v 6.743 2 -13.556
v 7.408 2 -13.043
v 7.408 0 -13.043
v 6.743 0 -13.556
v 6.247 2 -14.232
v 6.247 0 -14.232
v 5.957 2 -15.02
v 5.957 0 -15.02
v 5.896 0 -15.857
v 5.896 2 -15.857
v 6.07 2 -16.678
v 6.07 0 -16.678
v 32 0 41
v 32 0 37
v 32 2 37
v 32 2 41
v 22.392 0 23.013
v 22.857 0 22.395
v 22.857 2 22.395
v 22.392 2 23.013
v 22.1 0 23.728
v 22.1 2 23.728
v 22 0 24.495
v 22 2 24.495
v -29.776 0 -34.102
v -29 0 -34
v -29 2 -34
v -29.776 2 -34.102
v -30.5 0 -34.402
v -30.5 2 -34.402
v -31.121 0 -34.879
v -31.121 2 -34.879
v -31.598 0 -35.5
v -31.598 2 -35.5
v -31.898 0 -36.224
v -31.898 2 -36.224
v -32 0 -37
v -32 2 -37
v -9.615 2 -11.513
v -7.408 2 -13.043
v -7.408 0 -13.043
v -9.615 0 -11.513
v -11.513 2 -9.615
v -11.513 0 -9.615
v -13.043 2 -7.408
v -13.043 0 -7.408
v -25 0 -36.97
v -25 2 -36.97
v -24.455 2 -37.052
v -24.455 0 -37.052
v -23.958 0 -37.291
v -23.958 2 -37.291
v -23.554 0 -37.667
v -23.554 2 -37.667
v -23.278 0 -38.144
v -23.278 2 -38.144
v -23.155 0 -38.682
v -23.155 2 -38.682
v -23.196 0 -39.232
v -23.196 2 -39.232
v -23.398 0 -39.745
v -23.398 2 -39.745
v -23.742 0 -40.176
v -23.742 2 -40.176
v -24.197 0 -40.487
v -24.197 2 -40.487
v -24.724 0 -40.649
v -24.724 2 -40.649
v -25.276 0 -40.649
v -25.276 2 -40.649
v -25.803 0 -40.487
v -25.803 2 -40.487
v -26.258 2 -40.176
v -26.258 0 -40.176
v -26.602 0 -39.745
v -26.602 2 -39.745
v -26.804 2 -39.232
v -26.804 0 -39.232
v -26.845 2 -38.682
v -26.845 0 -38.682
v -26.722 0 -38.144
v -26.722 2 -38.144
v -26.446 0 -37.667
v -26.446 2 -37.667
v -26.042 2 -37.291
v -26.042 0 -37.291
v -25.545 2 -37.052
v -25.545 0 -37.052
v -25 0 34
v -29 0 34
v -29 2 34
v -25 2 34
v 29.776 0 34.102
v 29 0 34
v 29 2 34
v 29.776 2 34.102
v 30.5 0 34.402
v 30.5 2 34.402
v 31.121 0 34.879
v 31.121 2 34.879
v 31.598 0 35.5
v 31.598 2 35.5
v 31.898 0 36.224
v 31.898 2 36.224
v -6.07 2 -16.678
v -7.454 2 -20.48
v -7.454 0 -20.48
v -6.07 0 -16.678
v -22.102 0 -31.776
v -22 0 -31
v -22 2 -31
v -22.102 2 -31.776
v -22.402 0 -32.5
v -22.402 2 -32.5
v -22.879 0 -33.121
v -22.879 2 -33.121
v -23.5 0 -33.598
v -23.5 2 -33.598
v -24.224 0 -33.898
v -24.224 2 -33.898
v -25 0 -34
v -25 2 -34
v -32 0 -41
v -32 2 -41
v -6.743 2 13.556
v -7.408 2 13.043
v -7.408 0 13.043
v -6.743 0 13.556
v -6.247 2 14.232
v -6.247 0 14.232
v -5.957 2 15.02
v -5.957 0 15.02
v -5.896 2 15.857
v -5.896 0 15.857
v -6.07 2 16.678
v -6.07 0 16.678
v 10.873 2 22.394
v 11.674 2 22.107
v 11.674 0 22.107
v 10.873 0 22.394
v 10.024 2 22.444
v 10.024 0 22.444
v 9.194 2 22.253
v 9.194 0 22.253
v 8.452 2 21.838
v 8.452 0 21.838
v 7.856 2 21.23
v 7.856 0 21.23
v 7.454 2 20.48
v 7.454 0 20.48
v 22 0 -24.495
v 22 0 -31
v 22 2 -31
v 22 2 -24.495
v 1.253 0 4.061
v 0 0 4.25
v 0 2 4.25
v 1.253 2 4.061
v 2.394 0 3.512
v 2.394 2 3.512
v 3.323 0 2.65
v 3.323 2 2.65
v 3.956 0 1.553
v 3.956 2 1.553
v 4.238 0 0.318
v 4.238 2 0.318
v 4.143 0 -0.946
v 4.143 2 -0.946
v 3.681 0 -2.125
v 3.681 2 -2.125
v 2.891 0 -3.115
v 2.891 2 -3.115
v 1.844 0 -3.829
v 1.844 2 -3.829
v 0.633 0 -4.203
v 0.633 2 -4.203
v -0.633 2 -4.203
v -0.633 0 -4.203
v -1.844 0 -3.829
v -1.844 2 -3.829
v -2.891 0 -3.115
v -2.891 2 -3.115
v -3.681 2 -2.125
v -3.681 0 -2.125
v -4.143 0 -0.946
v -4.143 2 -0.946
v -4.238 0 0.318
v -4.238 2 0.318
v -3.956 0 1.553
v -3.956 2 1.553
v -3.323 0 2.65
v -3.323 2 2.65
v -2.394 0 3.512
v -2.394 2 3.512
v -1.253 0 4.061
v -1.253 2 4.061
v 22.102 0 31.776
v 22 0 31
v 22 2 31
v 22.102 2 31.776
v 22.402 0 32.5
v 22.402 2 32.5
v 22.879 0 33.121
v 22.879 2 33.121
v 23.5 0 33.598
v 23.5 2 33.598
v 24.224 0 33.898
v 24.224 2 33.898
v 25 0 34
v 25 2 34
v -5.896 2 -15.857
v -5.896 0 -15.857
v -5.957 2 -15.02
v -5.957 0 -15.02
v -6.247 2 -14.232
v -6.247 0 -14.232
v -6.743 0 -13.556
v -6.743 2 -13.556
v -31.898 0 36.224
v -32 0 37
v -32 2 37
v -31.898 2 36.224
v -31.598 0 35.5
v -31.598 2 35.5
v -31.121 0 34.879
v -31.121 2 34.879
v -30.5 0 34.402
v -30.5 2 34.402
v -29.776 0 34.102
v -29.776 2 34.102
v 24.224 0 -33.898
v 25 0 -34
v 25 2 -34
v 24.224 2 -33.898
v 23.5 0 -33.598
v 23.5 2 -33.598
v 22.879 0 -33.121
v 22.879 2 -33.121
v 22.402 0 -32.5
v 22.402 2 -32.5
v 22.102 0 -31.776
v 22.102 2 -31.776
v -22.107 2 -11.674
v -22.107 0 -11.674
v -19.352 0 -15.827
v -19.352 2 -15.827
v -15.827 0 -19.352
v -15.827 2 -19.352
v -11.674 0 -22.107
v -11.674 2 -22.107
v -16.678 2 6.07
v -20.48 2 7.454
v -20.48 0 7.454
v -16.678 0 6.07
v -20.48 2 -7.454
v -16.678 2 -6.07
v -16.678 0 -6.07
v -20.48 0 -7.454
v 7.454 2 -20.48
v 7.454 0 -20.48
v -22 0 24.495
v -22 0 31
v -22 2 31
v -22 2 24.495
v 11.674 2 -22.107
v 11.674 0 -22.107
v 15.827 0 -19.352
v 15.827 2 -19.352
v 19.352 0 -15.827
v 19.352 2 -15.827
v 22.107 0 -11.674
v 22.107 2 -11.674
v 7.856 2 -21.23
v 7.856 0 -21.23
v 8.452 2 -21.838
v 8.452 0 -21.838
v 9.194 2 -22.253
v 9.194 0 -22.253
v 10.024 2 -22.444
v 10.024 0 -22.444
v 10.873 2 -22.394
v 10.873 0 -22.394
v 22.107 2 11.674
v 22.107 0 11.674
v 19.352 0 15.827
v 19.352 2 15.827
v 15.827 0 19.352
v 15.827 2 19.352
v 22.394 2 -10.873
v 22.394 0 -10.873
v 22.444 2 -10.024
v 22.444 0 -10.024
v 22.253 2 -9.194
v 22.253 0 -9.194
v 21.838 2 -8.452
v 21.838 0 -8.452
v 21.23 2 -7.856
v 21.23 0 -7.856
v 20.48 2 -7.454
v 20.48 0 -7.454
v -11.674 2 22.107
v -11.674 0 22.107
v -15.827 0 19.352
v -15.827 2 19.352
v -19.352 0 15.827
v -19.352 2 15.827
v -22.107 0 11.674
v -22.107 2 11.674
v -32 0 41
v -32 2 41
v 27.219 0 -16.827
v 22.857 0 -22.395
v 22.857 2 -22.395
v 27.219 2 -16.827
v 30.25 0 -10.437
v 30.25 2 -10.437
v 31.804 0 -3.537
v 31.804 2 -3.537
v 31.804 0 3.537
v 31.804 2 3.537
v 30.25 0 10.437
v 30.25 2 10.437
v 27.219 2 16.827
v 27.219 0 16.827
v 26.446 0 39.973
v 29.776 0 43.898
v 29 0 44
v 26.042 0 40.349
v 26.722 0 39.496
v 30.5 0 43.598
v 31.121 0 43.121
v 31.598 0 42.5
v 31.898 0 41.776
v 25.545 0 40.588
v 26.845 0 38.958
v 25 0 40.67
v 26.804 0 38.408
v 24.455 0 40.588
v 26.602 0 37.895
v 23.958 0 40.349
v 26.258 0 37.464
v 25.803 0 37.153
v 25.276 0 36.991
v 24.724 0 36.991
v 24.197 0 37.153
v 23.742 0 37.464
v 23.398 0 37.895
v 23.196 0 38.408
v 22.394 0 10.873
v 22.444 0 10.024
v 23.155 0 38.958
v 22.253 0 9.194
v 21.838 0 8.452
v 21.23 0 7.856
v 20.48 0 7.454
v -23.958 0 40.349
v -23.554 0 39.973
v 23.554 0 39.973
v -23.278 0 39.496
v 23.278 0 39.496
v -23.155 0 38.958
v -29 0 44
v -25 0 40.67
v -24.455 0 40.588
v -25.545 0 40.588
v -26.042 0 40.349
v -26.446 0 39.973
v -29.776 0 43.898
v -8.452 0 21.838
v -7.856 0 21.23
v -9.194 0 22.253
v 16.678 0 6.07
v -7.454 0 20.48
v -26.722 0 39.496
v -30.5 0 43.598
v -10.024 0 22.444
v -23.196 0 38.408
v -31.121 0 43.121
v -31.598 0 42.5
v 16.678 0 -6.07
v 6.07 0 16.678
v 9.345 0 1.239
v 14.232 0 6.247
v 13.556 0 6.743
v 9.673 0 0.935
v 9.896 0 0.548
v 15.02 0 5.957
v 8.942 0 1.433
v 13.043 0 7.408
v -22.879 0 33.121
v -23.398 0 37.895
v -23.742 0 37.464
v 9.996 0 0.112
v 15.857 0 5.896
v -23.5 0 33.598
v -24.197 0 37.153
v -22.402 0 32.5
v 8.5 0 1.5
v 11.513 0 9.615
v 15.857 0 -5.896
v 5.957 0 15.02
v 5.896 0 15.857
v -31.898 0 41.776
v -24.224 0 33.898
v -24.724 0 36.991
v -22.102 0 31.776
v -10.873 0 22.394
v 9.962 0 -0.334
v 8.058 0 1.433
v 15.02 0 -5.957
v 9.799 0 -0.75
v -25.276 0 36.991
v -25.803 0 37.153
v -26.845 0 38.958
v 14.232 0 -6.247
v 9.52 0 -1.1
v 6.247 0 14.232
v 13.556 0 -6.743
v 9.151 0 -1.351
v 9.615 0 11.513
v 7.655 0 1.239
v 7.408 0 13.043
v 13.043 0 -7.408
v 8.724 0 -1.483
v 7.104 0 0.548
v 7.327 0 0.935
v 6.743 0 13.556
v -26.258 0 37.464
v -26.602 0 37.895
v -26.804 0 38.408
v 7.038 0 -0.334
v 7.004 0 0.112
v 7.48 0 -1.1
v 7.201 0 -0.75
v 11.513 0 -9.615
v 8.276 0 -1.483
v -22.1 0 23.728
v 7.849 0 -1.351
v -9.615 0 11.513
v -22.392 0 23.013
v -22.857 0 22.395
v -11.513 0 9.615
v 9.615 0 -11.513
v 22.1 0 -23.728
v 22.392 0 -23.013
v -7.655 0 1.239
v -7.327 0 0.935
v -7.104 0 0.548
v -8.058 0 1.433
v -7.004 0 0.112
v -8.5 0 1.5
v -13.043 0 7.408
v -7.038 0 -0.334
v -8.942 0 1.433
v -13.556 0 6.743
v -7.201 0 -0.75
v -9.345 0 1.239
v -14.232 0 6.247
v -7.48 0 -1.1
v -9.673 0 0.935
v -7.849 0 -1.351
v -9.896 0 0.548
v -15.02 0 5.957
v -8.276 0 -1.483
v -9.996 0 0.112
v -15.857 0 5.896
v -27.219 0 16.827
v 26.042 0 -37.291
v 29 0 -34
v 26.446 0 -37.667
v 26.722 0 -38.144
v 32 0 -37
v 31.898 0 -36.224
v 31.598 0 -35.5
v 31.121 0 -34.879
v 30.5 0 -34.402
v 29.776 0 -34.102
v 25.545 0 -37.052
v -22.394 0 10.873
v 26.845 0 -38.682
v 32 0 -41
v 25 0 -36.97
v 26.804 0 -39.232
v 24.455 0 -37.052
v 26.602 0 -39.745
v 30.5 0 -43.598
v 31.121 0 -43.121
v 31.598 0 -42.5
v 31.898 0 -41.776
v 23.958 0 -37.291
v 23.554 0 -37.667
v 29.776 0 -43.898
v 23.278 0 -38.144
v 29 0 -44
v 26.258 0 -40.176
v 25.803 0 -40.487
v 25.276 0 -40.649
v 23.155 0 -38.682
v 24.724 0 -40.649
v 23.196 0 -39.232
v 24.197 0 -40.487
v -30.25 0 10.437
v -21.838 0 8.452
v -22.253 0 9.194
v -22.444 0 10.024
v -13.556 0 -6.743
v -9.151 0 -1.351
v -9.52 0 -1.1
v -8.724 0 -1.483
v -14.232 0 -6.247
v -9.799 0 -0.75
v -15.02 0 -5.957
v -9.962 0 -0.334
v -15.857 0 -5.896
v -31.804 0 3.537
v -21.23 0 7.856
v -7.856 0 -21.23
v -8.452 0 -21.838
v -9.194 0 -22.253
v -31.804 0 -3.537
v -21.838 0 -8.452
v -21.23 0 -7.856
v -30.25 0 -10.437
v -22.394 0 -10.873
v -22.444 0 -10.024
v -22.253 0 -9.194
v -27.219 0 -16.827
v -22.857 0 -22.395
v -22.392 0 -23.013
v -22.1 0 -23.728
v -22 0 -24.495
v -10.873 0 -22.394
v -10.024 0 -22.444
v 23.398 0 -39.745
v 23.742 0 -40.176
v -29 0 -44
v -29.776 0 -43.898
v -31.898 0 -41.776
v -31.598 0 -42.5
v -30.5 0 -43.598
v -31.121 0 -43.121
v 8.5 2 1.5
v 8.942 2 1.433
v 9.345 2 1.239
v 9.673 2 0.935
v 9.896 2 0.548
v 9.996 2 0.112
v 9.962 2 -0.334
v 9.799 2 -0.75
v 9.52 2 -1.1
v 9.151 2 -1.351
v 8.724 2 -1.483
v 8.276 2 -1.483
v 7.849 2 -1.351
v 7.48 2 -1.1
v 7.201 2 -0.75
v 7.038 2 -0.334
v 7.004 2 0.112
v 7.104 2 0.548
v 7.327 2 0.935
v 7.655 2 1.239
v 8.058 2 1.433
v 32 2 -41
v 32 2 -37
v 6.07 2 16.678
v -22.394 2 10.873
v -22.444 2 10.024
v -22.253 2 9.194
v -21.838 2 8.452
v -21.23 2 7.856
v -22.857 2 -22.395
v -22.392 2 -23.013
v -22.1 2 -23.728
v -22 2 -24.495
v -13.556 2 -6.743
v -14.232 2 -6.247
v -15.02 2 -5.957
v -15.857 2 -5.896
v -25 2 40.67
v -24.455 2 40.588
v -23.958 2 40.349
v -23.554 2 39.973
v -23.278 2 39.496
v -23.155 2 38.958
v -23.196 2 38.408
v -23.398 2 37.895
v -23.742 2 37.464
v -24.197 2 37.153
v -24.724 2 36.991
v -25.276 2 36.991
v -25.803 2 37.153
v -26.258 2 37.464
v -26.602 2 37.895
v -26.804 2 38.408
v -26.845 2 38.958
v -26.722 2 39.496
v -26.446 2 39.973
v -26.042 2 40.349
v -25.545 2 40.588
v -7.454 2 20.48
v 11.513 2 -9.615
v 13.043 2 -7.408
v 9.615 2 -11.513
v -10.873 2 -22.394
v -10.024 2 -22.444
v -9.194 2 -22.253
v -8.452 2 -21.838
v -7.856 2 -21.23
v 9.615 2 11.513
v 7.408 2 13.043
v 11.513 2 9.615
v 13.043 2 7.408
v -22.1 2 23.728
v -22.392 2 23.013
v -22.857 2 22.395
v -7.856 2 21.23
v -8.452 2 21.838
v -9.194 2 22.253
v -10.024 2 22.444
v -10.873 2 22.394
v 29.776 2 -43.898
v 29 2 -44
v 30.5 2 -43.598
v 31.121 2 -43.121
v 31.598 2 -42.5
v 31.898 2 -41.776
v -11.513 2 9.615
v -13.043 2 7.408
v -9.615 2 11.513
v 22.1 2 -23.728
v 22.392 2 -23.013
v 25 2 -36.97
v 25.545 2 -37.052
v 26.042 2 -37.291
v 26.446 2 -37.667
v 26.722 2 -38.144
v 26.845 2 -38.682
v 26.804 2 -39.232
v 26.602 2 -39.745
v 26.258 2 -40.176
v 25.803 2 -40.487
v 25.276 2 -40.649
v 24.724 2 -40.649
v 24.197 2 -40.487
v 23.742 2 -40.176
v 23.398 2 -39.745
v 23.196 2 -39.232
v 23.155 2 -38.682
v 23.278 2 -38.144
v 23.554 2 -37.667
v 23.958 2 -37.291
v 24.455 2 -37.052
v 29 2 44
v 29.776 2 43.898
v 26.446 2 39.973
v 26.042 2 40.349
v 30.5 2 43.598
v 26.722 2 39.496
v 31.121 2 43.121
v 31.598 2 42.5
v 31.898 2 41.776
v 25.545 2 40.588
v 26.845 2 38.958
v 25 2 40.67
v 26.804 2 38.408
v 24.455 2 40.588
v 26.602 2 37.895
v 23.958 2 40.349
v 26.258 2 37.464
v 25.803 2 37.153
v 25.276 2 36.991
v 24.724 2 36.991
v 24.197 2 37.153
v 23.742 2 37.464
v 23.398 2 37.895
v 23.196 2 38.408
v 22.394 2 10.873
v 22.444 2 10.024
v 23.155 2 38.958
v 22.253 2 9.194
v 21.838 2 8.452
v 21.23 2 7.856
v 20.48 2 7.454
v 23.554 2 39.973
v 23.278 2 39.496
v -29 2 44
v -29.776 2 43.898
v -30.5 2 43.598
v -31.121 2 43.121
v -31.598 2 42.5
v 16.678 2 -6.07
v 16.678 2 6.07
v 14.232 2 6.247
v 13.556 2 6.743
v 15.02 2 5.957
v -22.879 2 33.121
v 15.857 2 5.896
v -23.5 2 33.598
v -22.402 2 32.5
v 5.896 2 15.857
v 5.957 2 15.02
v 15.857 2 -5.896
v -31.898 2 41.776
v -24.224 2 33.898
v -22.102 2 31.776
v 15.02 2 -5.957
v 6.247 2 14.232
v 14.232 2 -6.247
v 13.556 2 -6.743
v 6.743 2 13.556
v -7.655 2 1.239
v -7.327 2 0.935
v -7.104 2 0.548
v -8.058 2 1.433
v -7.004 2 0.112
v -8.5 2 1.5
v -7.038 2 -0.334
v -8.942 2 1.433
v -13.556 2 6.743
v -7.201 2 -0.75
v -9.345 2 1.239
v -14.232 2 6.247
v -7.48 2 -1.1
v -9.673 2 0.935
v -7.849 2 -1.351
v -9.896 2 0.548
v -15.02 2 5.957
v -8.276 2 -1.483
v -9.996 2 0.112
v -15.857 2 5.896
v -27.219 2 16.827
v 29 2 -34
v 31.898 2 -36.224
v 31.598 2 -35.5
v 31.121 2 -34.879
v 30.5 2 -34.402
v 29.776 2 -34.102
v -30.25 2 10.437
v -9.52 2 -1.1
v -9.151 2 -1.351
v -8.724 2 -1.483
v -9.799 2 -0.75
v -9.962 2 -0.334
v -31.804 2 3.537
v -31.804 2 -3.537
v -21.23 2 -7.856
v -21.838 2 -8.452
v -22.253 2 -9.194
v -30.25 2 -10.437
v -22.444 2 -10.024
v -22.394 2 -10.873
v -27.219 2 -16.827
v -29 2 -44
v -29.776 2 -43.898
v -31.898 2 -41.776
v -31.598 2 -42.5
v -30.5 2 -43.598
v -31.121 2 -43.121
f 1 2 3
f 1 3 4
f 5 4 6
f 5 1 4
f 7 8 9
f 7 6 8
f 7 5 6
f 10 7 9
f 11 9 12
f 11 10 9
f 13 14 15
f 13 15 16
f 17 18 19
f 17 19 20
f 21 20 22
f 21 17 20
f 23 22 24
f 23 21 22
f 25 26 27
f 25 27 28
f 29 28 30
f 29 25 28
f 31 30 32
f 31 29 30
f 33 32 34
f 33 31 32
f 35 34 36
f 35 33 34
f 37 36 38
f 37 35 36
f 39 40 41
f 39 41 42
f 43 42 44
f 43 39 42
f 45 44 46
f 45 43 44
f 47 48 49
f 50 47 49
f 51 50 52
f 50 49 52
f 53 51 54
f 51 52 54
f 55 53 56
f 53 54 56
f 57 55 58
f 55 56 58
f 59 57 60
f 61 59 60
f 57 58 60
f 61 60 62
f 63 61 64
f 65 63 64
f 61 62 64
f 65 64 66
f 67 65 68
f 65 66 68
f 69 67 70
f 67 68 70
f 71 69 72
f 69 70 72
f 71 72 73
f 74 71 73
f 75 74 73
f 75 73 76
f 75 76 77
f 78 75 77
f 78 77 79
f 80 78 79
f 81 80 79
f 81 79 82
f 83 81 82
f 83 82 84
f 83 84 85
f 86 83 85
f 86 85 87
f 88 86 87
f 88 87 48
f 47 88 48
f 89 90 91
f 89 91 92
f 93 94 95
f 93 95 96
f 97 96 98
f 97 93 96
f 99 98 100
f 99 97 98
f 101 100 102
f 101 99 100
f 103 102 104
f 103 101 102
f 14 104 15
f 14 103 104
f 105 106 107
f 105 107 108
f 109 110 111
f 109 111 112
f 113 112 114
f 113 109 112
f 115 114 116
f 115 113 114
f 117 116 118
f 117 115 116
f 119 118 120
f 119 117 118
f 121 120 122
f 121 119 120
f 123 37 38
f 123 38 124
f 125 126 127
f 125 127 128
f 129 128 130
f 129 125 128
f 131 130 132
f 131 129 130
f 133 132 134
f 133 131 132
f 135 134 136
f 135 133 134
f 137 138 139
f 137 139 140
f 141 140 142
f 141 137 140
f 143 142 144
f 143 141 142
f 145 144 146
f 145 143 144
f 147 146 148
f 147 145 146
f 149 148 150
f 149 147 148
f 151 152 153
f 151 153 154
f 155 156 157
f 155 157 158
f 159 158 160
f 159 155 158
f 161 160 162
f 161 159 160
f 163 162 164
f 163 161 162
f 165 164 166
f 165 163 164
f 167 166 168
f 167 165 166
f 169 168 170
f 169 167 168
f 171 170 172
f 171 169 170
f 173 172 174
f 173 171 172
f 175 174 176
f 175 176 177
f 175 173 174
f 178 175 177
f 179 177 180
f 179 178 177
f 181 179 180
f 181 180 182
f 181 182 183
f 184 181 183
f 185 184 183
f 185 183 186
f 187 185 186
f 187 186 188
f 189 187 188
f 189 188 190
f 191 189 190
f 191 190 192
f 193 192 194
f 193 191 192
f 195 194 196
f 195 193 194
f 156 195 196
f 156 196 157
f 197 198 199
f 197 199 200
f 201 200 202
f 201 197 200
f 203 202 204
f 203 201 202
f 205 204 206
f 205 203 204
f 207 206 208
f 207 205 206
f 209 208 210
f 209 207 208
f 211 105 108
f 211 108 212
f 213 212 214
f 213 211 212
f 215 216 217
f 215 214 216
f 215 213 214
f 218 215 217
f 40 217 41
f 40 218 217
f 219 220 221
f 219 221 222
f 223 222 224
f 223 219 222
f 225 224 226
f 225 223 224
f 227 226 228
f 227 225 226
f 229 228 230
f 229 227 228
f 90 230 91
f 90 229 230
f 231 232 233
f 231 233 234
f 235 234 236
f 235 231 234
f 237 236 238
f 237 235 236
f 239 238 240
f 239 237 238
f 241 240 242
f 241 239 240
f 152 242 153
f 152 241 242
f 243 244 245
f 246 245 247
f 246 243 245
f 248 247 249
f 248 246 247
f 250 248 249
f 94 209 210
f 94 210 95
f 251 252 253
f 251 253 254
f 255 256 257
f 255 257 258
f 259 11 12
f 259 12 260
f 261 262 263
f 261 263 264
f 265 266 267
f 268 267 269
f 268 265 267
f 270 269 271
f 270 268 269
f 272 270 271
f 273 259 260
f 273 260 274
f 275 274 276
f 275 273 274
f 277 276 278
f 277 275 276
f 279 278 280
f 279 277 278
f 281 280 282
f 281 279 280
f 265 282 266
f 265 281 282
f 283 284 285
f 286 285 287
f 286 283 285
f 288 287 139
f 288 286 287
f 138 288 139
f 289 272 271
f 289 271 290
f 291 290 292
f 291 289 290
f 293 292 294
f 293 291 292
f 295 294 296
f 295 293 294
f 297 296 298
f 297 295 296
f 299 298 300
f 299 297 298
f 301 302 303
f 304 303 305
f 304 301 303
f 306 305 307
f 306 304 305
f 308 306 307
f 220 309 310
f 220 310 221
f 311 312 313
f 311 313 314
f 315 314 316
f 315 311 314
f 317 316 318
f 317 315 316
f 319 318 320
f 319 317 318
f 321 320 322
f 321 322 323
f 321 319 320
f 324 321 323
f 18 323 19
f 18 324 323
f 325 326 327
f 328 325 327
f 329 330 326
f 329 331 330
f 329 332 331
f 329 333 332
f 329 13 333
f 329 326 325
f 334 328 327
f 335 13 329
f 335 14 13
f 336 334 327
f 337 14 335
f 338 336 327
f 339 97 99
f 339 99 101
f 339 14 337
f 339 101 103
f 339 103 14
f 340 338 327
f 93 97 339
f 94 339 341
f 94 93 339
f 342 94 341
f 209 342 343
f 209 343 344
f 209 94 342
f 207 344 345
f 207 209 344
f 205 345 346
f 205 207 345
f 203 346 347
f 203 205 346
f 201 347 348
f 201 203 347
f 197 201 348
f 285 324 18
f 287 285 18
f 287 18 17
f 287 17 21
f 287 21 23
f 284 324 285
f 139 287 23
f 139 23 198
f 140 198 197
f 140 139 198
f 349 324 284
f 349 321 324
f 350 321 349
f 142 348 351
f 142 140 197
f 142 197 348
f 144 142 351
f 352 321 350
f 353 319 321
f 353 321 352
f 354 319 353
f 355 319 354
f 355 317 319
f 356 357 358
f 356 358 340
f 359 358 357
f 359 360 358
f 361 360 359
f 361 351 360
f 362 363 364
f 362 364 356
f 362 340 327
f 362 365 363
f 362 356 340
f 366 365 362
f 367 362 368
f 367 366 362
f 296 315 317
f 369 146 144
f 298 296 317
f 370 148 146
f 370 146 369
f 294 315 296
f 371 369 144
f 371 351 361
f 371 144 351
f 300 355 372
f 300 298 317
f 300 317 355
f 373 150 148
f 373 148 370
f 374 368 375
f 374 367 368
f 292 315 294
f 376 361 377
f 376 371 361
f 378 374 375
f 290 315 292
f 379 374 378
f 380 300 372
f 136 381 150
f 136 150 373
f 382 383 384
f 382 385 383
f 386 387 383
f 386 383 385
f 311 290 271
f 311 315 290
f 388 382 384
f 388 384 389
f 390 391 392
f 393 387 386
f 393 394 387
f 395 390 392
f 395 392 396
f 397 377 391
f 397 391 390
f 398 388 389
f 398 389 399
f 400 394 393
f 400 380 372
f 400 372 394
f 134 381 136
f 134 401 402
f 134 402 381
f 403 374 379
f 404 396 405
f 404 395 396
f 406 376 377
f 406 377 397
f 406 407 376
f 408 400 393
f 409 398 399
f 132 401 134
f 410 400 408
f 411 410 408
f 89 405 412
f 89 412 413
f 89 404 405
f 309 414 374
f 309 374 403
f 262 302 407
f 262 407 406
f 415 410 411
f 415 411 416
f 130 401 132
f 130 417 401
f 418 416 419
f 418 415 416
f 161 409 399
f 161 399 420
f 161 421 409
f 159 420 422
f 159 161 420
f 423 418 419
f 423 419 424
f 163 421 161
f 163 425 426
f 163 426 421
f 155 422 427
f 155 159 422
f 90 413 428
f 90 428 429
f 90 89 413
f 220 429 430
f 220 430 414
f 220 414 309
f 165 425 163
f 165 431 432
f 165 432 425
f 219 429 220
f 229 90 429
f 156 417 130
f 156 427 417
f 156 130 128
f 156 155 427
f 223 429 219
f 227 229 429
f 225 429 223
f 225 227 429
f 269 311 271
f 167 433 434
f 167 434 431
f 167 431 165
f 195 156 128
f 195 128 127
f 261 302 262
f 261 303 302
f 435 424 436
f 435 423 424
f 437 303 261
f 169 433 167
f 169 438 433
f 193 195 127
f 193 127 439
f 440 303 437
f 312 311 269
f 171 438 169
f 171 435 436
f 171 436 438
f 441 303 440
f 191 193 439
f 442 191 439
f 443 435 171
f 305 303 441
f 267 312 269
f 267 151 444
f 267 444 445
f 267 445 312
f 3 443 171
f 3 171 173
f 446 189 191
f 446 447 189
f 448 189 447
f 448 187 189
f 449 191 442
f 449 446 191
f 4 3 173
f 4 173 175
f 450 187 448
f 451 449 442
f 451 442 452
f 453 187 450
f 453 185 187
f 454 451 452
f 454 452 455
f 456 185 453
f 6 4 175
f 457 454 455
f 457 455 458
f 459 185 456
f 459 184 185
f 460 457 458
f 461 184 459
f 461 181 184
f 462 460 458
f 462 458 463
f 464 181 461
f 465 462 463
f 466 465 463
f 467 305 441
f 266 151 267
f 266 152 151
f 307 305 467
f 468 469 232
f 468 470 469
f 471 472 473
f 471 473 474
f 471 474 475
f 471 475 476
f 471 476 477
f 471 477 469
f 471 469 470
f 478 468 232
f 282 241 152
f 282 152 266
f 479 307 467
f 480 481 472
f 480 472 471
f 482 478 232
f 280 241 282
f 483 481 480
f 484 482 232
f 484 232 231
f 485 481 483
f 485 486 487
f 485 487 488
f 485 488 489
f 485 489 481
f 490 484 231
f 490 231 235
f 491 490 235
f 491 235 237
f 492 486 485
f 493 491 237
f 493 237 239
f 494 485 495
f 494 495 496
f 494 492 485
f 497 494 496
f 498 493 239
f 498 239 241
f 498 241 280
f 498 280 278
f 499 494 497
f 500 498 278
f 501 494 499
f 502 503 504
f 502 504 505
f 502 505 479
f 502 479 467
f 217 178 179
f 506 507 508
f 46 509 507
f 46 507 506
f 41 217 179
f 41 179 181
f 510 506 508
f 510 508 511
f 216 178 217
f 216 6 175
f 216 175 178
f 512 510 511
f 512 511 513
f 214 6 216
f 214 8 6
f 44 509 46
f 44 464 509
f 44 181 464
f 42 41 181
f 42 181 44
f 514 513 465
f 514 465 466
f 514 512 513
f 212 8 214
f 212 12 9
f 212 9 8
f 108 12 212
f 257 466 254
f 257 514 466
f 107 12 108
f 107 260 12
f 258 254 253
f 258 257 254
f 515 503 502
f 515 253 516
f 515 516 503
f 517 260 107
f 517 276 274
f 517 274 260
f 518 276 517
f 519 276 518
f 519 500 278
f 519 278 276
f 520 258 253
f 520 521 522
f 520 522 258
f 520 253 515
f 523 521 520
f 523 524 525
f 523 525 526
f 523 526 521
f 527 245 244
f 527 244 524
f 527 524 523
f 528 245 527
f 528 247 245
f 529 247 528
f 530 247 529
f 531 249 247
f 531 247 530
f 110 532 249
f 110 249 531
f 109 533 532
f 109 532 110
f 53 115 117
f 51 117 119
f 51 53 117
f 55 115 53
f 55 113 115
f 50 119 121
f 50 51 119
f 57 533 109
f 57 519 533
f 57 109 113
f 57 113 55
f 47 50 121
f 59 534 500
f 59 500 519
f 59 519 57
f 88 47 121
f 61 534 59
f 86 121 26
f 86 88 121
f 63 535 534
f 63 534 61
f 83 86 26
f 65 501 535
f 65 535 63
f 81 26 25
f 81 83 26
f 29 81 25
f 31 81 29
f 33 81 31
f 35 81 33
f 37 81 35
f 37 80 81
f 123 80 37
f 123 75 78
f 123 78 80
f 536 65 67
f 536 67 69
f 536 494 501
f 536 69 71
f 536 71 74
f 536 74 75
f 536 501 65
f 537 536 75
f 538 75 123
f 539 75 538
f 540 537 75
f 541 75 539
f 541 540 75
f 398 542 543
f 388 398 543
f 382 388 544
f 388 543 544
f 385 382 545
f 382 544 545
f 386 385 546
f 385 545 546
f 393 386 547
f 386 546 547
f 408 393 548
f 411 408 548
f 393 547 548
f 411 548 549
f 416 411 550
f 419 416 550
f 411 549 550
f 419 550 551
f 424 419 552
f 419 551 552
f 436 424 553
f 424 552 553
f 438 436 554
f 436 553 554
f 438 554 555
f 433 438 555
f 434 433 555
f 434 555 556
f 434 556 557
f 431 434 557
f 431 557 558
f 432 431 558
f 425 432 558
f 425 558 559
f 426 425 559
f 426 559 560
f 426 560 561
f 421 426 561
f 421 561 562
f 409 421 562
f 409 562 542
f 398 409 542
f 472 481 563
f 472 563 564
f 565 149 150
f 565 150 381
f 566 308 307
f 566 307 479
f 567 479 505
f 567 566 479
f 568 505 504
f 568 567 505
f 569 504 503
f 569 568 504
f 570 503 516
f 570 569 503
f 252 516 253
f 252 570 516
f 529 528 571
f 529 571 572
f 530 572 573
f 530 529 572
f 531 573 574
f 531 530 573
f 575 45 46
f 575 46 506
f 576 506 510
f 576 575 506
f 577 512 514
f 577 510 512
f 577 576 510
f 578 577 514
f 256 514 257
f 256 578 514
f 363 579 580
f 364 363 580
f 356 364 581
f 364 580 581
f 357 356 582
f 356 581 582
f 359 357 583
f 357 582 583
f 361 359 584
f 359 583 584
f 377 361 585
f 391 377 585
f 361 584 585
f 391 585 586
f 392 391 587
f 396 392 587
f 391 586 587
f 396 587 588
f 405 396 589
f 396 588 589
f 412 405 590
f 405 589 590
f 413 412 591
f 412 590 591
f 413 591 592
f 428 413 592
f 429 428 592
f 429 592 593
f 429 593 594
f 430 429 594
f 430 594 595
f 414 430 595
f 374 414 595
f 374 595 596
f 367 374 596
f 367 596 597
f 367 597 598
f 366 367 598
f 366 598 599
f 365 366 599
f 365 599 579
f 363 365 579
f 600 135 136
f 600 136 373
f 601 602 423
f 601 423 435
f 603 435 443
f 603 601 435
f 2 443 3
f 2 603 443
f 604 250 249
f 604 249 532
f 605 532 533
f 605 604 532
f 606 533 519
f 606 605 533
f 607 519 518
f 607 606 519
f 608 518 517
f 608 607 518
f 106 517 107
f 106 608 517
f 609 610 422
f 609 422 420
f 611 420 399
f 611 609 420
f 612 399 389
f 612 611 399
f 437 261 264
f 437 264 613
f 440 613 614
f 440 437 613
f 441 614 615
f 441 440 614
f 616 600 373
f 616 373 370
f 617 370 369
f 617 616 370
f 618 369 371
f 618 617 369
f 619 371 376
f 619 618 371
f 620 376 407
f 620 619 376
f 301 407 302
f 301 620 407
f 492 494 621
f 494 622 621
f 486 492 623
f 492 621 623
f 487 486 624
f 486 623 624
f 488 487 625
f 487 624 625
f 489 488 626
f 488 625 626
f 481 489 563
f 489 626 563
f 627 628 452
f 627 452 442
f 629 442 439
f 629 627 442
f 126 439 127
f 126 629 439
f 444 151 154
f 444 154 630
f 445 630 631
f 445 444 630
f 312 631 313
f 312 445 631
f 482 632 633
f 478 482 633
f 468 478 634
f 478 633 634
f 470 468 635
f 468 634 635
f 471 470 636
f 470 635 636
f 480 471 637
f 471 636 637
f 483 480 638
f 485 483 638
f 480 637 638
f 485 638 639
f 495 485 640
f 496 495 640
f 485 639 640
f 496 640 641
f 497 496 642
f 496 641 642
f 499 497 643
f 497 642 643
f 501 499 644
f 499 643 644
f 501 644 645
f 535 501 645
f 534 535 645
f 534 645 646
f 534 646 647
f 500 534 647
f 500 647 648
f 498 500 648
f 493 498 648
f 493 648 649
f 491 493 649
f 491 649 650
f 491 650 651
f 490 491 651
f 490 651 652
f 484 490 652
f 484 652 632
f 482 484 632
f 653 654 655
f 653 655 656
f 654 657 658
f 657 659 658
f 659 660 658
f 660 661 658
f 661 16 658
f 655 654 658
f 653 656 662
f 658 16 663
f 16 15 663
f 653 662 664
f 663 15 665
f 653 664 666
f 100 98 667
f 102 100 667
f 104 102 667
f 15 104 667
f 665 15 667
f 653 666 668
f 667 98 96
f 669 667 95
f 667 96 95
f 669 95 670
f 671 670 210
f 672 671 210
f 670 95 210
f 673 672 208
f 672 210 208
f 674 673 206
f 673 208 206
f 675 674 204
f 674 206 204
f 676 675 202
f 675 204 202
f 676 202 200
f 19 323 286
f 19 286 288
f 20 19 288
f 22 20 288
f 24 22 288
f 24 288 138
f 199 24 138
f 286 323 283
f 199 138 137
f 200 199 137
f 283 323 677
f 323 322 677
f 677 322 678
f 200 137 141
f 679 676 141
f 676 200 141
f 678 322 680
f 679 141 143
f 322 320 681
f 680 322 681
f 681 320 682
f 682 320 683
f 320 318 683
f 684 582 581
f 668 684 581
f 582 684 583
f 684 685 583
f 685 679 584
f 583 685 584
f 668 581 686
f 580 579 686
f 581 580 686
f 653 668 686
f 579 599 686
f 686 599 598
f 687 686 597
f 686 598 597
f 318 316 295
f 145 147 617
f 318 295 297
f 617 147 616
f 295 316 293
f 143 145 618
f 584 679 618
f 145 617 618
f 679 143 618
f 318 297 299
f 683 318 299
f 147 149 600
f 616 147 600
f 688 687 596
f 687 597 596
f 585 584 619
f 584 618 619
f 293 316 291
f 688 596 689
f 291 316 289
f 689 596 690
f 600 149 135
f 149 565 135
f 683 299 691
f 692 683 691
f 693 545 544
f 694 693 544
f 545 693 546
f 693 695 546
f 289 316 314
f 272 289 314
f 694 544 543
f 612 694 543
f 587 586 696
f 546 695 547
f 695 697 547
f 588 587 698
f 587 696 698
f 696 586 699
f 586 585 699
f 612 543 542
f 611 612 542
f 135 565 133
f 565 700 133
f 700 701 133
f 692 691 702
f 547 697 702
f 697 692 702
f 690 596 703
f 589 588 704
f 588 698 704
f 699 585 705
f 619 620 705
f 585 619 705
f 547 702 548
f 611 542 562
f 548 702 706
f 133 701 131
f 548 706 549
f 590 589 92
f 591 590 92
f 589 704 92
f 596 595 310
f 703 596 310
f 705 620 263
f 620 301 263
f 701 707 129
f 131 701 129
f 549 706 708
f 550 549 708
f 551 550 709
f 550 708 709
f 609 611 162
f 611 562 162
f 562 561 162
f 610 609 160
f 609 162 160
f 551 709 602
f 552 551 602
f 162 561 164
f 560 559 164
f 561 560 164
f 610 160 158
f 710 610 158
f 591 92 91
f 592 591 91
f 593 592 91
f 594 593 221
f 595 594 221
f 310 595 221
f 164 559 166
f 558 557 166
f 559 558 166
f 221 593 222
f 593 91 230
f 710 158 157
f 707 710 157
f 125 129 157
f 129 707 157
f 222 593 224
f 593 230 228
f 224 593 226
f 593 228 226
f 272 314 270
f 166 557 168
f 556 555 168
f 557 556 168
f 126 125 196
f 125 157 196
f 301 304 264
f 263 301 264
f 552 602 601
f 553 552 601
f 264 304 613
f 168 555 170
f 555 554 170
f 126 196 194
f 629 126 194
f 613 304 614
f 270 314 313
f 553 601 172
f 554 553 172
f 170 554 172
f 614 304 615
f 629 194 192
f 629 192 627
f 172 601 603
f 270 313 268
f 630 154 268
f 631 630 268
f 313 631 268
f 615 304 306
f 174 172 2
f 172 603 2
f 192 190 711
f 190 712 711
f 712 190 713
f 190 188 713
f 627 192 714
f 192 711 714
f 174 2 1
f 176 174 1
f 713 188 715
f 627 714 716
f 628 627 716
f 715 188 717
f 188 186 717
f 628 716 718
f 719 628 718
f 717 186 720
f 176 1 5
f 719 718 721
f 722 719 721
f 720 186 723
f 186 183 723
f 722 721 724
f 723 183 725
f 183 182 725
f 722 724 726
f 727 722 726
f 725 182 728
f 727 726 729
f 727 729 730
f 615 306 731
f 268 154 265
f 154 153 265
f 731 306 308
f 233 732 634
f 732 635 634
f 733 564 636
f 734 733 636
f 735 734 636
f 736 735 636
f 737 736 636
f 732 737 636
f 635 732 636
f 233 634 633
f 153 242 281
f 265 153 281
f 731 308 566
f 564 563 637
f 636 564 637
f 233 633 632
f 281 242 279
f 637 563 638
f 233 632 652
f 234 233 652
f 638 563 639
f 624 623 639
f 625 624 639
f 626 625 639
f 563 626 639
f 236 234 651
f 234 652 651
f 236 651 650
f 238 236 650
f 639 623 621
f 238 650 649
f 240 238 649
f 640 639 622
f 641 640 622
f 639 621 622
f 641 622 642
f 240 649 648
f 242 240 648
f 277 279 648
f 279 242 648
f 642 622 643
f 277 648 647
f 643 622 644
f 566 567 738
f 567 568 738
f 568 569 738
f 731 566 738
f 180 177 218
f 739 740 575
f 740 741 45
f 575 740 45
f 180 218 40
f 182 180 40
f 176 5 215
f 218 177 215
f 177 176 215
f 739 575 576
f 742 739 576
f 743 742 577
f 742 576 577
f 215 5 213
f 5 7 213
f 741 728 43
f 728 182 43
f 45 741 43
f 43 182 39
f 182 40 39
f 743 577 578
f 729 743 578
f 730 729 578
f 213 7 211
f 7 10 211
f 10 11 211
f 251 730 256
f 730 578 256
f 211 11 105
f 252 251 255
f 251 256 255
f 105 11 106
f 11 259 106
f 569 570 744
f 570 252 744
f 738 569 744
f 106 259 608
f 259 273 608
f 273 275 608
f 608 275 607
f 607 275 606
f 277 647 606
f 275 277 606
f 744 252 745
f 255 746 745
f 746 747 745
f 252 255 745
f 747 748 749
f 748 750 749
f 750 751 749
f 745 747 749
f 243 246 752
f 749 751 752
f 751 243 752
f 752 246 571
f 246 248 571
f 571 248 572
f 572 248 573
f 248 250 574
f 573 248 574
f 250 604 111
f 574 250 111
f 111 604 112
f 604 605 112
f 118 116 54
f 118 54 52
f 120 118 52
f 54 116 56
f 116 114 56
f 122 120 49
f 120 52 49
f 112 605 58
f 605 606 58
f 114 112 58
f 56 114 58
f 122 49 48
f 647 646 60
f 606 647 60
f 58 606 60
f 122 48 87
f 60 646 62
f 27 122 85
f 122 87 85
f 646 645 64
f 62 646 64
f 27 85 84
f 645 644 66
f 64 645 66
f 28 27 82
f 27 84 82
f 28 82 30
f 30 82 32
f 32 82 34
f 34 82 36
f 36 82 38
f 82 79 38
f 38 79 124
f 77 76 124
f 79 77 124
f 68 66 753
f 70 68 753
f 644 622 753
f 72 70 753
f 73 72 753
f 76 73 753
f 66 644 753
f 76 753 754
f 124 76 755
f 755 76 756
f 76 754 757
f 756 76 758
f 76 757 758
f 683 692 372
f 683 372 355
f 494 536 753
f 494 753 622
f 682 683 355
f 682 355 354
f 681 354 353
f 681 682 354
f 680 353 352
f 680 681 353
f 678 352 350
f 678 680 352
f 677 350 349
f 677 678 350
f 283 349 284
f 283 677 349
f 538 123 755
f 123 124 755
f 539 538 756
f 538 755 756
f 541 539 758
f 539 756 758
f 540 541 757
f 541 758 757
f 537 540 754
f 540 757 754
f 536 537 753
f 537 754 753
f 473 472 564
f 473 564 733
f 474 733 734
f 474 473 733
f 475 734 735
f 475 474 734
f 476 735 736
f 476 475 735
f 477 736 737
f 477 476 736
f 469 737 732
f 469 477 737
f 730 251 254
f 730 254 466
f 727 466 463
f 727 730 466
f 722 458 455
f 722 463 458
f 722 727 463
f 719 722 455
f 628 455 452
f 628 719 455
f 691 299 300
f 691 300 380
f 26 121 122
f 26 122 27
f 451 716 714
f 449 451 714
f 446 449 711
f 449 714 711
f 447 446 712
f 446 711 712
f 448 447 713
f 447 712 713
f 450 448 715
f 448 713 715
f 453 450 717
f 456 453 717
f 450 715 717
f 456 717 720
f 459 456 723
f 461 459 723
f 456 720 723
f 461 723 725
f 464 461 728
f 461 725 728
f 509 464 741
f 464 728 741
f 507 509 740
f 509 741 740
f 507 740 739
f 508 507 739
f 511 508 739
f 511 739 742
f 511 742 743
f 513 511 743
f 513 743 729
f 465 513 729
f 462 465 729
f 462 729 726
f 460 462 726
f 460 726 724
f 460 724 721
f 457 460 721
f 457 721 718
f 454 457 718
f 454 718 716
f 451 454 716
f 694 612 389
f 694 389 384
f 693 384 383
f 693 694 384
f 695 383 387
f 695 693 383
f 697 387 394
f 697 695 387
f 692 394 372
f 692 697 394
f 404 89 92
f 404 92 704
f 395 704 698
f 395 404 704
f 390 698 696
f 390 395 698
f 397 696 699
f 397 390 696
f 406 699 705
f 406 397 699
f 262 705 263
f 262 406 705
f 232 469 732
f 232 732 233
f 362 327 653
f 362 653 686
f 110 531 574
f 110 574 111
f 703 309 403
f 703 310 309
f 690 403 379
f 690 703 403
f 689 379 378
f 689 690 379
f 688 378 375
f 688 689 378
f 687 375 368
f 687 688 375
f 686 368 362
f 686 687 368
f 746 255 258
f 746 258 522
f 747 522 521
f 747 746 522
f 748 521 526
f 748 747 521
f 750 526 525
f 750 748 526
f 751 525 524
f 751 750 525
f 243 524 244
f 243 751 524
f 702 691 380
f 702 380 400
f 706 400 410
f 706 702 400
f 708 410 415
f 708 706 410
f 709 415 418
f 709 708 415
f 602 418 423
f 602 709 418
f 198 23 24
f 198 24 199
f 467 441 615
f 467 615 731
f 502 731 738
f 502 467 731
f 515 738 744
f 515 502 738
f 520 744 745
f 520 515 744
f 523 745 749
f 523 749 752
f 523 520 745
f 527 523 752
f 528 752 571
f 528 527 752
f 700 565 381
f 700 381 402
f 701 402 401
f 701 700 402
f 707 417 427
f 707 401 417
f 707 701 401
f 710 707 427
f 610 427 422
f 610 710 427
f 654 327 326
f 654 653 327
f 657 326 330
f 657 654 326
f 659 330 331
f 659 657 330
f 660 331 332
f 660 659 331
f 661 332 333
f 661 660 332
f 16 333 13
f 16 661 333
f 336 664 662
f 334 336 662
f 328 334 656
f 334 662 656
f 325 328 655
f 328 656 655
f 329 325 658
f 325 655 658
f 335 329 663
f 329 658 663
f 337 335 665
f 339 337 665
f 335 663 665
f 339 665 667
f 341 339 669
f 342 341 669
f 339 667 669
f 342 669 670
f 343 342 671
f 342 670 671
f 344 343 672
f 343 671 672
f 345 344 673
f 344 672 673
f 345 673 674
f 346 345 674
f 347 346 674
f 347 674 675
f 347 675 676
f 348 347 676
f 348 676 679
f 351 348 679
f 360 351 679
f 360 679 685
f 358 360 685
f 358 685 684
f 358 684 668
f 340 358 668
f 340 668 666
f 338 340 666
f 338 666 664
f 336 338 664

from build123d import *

# Parameters (mm, degrees)
SKETCH1_R           = 4.25
BOSS_EXTRUDE1_DEPTH = 2
CUT_EXTRUDE1_DEPTH  = 5
CIRPATTERN1_COUNT   = 4
SKETCH3_R           = 1.5
CUT_EXTRUDE2_DEPTH  = 5
SKETCH5_R           = 1.85
CUT_EXTRUDE3_DEPTH  = 5
FILLET1_R           = 3


with BuildPart() as part:
    # Sketch1 → Boss-Extrude1 (new body)
    with BuildSketch(Plane(origin=(0, 0, 0), x_dir=(1, 0, 0), z_dir=(0, 1, 0))):
        with BuildLine():
            Line((-29, -34), (-25, -34))
            ThreePointArc((-25, -34), (-22.878679656, -33.121320344), (-22, -31))
            Line((-22, -31), (-22, -24.494897428))
            ThreePointArc((-22, -24.494897428), (-22.222539701, -23.361004009), (-22.857142857, -22.395334791))
            ThreePointArc((-22.857142857, -22.395334791), (-32, 0), (-22.857142857, 22.395334791))
            ThreePointArc((-22.857142857, 22.395334791), (-22.222539701, 23.361004009), (-22, 24.494897428))
            Line((-22, 24.494897428), (-22, 31))
            ThreePointArc((-22, 31), (-22.878679656, 33.121320344), (-25, 34))
            Line((-25, 34), (-29, 34))
            ThreePointArc((-29, 34), (-31.121320344, 34.878679656), (-32, 37))
            Line((-32, 37), (-32, 44))
            Line((-32, 44), (32, 44))
            Line((32, 44), (32, 37))
            ThreePointArc((32, 37), (31.121320344, 34.878679656), (29, 34))
            Line((29, 34), (25, 34))
            ThreePointArc((25, 34), (22.878679656, 33.121320344), (22, 31))
            Line((22, 31), (22, 24.494897428))
            ThreePointArc((22, 24.494897428), (22.222539701, 23.361004009), (22.857142857, 22.395334791))
            ThreePointArc((22.857142857, 22.395334791), (32, 0), (22.857142857, -22.395334791))
            ThreePointArc((22.857142857, -22.395334791), (22.222539701, -23.361004009), (22, -24.494897428))
            Line((22, -24.494897428), (22, -31))
            ThreePointArc((22, -31), (22.878679656, -33.121320344), (25, -34))
            Line((25, -34), (29, -34))
            ThreePointArc((29, -34), (31.121320344, -34.878679656), (32, -37))
            Line((32, -37), (32, -44))
            Line((32, -44), (-32, -44))
            Line((-32, -44), (-32, -37))
            ThreePointArc((-32, -37), (-31.121320344, -34.878679656), (-29, -34))
        make_face()
        with Locations(Location((0, 0, 0), (0, 0, 270))):
            Circle(SKETCH1_R, mode=Mode.SUBTRACT)
    extrude(amount=BOSS_EXTRUDE1_DEPTH)

    # Sketch2 → Cut-Extrude1 (cut)
    with BuildSketch(Plane(origin=(0, 2, 0), x_dir=(1, 0, 0), z_dir=(0, 1, 0))):
        with BuildLine():
            ThreePointArc((-11.674129624, 22.106892534), (-9.194159134, 22.25327912), (-7.454156207, 20.48012586))
            Line((-7.454156207, 20.48012586), (-6.070255366, 16.677889548))
            ThreePointArc((-6.070255366, 16.677889548), (-6.073907786, 14.615788781), (-7.40777769, 13.043190932))
            ThreePointArc((-7.40777769, 13.043190932), (-10.606601718, 10.606601718), (-13.043190932, 7.40777769))
            ThreePointArc((-13.043190932, 7.40777769), (-14.615788781, 6.073907786), (-16.677889548, 6.070255366))
            Line((-16.677889548, 6.070255366), (-20.48012586, 7.454156207))
            ThreePointArc((-20.48012586, 7.454156207), (-22.25327912, 9.194159134), (-22.106892534, 11.674129624))
            ThreePointArc((-22.106892534, 11.674129624), (-17.67766953, 17.67766953), (-11.674129624, 22.106892534))
        make_face()
    cut_extrude1 = extrude(amount=-CUT_EXTRUDE1_DEPTH, mode=Mode.SUBTRACT)

    # CirPattern1: Cut-Extrude1 ×4 about axis
    cirpattern1_axis = Axis((0, 0, 0), (0, 1, 0))
    for i in range(1, CIRPATTERN1_COUNT):
        add(cut_extrude1.rotate(cirpattern1_axis, i * 360 / CIRPATTERN1_COUNT), mode=Mode.SUBTRACT)

    # Sketch3 → Cut-Extrude2 (cut)
    with BuildSketch(Plane(origin=(0, 2, 0), x_dir=(1, 0, 0), z_dir=(0, 1, 0))):
        with Locations(Location((-8.5, 0, 0), (0, 0, 270))):
            Circle(SKETCH3_R)
        with Locations(Location((8.5, 0, 0), (0, 0, 270))):
            Circle(SKETCH3_R)
    extrude(amount=-CUT_EXTRUDE2_DEPTH, mode=Mode.SUBTRACT)

    # Sketch5 → Cut-Extrude3 (cut)
    with BuildSketch(Plane(origin=(0, 2, 0), x_dir=(1, 0, 0), z_dir=(0, 1, 0))):
        with Locations(Location((25, 38.82, 0), (0, 0, 270))):
            Circle(SKETCH5_R)
        with Locations(Location((-25, 38.82, 0), (0, 0, 270))):
            Circle(SKETCH5_R)
        with Locations(Location((-25, -38.82, 0), (0, 0, 270))):
            Circle(SKETCH5_R)
        with Locations(Location((25, -38.82, 0), (0, 0, 270))):
            Circle(SKETCH5_R)
    extrude(amount=-CUT_EXTRUDE3_DEPTH, mode=Mode.SUBTRACT)

    # Fillet1
    fillet1_edges = [part.edges().sort_by_distance(p)[0] for p in [
        (-32, 1, -44),
        (32, 1, -44),
        (32, 1, 44),
        (-32, 1, 44),
    ]]
    fillet(fillet1_edges, radius=FILLET1_R)


solid = part.part
